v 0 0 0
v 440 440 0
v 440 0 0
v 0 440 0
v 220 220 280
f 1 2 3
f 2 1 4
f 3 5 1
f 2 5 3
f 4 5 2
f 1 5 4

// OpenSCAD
// Unit of length: Unit.MM
polyhedron(points = [[0.0, 0.0, 0.0], [440.0, 0.0, 0.0], [440.0, 440.0, 0.0], [0.0, 440.0, 0.0], [220.0, 220.0, 280.0]], faces = [[0, 1, 2, 3], [0, 4, 1], [1, 4, 2], [2, 4, 3], [3, 4, 0]]);
